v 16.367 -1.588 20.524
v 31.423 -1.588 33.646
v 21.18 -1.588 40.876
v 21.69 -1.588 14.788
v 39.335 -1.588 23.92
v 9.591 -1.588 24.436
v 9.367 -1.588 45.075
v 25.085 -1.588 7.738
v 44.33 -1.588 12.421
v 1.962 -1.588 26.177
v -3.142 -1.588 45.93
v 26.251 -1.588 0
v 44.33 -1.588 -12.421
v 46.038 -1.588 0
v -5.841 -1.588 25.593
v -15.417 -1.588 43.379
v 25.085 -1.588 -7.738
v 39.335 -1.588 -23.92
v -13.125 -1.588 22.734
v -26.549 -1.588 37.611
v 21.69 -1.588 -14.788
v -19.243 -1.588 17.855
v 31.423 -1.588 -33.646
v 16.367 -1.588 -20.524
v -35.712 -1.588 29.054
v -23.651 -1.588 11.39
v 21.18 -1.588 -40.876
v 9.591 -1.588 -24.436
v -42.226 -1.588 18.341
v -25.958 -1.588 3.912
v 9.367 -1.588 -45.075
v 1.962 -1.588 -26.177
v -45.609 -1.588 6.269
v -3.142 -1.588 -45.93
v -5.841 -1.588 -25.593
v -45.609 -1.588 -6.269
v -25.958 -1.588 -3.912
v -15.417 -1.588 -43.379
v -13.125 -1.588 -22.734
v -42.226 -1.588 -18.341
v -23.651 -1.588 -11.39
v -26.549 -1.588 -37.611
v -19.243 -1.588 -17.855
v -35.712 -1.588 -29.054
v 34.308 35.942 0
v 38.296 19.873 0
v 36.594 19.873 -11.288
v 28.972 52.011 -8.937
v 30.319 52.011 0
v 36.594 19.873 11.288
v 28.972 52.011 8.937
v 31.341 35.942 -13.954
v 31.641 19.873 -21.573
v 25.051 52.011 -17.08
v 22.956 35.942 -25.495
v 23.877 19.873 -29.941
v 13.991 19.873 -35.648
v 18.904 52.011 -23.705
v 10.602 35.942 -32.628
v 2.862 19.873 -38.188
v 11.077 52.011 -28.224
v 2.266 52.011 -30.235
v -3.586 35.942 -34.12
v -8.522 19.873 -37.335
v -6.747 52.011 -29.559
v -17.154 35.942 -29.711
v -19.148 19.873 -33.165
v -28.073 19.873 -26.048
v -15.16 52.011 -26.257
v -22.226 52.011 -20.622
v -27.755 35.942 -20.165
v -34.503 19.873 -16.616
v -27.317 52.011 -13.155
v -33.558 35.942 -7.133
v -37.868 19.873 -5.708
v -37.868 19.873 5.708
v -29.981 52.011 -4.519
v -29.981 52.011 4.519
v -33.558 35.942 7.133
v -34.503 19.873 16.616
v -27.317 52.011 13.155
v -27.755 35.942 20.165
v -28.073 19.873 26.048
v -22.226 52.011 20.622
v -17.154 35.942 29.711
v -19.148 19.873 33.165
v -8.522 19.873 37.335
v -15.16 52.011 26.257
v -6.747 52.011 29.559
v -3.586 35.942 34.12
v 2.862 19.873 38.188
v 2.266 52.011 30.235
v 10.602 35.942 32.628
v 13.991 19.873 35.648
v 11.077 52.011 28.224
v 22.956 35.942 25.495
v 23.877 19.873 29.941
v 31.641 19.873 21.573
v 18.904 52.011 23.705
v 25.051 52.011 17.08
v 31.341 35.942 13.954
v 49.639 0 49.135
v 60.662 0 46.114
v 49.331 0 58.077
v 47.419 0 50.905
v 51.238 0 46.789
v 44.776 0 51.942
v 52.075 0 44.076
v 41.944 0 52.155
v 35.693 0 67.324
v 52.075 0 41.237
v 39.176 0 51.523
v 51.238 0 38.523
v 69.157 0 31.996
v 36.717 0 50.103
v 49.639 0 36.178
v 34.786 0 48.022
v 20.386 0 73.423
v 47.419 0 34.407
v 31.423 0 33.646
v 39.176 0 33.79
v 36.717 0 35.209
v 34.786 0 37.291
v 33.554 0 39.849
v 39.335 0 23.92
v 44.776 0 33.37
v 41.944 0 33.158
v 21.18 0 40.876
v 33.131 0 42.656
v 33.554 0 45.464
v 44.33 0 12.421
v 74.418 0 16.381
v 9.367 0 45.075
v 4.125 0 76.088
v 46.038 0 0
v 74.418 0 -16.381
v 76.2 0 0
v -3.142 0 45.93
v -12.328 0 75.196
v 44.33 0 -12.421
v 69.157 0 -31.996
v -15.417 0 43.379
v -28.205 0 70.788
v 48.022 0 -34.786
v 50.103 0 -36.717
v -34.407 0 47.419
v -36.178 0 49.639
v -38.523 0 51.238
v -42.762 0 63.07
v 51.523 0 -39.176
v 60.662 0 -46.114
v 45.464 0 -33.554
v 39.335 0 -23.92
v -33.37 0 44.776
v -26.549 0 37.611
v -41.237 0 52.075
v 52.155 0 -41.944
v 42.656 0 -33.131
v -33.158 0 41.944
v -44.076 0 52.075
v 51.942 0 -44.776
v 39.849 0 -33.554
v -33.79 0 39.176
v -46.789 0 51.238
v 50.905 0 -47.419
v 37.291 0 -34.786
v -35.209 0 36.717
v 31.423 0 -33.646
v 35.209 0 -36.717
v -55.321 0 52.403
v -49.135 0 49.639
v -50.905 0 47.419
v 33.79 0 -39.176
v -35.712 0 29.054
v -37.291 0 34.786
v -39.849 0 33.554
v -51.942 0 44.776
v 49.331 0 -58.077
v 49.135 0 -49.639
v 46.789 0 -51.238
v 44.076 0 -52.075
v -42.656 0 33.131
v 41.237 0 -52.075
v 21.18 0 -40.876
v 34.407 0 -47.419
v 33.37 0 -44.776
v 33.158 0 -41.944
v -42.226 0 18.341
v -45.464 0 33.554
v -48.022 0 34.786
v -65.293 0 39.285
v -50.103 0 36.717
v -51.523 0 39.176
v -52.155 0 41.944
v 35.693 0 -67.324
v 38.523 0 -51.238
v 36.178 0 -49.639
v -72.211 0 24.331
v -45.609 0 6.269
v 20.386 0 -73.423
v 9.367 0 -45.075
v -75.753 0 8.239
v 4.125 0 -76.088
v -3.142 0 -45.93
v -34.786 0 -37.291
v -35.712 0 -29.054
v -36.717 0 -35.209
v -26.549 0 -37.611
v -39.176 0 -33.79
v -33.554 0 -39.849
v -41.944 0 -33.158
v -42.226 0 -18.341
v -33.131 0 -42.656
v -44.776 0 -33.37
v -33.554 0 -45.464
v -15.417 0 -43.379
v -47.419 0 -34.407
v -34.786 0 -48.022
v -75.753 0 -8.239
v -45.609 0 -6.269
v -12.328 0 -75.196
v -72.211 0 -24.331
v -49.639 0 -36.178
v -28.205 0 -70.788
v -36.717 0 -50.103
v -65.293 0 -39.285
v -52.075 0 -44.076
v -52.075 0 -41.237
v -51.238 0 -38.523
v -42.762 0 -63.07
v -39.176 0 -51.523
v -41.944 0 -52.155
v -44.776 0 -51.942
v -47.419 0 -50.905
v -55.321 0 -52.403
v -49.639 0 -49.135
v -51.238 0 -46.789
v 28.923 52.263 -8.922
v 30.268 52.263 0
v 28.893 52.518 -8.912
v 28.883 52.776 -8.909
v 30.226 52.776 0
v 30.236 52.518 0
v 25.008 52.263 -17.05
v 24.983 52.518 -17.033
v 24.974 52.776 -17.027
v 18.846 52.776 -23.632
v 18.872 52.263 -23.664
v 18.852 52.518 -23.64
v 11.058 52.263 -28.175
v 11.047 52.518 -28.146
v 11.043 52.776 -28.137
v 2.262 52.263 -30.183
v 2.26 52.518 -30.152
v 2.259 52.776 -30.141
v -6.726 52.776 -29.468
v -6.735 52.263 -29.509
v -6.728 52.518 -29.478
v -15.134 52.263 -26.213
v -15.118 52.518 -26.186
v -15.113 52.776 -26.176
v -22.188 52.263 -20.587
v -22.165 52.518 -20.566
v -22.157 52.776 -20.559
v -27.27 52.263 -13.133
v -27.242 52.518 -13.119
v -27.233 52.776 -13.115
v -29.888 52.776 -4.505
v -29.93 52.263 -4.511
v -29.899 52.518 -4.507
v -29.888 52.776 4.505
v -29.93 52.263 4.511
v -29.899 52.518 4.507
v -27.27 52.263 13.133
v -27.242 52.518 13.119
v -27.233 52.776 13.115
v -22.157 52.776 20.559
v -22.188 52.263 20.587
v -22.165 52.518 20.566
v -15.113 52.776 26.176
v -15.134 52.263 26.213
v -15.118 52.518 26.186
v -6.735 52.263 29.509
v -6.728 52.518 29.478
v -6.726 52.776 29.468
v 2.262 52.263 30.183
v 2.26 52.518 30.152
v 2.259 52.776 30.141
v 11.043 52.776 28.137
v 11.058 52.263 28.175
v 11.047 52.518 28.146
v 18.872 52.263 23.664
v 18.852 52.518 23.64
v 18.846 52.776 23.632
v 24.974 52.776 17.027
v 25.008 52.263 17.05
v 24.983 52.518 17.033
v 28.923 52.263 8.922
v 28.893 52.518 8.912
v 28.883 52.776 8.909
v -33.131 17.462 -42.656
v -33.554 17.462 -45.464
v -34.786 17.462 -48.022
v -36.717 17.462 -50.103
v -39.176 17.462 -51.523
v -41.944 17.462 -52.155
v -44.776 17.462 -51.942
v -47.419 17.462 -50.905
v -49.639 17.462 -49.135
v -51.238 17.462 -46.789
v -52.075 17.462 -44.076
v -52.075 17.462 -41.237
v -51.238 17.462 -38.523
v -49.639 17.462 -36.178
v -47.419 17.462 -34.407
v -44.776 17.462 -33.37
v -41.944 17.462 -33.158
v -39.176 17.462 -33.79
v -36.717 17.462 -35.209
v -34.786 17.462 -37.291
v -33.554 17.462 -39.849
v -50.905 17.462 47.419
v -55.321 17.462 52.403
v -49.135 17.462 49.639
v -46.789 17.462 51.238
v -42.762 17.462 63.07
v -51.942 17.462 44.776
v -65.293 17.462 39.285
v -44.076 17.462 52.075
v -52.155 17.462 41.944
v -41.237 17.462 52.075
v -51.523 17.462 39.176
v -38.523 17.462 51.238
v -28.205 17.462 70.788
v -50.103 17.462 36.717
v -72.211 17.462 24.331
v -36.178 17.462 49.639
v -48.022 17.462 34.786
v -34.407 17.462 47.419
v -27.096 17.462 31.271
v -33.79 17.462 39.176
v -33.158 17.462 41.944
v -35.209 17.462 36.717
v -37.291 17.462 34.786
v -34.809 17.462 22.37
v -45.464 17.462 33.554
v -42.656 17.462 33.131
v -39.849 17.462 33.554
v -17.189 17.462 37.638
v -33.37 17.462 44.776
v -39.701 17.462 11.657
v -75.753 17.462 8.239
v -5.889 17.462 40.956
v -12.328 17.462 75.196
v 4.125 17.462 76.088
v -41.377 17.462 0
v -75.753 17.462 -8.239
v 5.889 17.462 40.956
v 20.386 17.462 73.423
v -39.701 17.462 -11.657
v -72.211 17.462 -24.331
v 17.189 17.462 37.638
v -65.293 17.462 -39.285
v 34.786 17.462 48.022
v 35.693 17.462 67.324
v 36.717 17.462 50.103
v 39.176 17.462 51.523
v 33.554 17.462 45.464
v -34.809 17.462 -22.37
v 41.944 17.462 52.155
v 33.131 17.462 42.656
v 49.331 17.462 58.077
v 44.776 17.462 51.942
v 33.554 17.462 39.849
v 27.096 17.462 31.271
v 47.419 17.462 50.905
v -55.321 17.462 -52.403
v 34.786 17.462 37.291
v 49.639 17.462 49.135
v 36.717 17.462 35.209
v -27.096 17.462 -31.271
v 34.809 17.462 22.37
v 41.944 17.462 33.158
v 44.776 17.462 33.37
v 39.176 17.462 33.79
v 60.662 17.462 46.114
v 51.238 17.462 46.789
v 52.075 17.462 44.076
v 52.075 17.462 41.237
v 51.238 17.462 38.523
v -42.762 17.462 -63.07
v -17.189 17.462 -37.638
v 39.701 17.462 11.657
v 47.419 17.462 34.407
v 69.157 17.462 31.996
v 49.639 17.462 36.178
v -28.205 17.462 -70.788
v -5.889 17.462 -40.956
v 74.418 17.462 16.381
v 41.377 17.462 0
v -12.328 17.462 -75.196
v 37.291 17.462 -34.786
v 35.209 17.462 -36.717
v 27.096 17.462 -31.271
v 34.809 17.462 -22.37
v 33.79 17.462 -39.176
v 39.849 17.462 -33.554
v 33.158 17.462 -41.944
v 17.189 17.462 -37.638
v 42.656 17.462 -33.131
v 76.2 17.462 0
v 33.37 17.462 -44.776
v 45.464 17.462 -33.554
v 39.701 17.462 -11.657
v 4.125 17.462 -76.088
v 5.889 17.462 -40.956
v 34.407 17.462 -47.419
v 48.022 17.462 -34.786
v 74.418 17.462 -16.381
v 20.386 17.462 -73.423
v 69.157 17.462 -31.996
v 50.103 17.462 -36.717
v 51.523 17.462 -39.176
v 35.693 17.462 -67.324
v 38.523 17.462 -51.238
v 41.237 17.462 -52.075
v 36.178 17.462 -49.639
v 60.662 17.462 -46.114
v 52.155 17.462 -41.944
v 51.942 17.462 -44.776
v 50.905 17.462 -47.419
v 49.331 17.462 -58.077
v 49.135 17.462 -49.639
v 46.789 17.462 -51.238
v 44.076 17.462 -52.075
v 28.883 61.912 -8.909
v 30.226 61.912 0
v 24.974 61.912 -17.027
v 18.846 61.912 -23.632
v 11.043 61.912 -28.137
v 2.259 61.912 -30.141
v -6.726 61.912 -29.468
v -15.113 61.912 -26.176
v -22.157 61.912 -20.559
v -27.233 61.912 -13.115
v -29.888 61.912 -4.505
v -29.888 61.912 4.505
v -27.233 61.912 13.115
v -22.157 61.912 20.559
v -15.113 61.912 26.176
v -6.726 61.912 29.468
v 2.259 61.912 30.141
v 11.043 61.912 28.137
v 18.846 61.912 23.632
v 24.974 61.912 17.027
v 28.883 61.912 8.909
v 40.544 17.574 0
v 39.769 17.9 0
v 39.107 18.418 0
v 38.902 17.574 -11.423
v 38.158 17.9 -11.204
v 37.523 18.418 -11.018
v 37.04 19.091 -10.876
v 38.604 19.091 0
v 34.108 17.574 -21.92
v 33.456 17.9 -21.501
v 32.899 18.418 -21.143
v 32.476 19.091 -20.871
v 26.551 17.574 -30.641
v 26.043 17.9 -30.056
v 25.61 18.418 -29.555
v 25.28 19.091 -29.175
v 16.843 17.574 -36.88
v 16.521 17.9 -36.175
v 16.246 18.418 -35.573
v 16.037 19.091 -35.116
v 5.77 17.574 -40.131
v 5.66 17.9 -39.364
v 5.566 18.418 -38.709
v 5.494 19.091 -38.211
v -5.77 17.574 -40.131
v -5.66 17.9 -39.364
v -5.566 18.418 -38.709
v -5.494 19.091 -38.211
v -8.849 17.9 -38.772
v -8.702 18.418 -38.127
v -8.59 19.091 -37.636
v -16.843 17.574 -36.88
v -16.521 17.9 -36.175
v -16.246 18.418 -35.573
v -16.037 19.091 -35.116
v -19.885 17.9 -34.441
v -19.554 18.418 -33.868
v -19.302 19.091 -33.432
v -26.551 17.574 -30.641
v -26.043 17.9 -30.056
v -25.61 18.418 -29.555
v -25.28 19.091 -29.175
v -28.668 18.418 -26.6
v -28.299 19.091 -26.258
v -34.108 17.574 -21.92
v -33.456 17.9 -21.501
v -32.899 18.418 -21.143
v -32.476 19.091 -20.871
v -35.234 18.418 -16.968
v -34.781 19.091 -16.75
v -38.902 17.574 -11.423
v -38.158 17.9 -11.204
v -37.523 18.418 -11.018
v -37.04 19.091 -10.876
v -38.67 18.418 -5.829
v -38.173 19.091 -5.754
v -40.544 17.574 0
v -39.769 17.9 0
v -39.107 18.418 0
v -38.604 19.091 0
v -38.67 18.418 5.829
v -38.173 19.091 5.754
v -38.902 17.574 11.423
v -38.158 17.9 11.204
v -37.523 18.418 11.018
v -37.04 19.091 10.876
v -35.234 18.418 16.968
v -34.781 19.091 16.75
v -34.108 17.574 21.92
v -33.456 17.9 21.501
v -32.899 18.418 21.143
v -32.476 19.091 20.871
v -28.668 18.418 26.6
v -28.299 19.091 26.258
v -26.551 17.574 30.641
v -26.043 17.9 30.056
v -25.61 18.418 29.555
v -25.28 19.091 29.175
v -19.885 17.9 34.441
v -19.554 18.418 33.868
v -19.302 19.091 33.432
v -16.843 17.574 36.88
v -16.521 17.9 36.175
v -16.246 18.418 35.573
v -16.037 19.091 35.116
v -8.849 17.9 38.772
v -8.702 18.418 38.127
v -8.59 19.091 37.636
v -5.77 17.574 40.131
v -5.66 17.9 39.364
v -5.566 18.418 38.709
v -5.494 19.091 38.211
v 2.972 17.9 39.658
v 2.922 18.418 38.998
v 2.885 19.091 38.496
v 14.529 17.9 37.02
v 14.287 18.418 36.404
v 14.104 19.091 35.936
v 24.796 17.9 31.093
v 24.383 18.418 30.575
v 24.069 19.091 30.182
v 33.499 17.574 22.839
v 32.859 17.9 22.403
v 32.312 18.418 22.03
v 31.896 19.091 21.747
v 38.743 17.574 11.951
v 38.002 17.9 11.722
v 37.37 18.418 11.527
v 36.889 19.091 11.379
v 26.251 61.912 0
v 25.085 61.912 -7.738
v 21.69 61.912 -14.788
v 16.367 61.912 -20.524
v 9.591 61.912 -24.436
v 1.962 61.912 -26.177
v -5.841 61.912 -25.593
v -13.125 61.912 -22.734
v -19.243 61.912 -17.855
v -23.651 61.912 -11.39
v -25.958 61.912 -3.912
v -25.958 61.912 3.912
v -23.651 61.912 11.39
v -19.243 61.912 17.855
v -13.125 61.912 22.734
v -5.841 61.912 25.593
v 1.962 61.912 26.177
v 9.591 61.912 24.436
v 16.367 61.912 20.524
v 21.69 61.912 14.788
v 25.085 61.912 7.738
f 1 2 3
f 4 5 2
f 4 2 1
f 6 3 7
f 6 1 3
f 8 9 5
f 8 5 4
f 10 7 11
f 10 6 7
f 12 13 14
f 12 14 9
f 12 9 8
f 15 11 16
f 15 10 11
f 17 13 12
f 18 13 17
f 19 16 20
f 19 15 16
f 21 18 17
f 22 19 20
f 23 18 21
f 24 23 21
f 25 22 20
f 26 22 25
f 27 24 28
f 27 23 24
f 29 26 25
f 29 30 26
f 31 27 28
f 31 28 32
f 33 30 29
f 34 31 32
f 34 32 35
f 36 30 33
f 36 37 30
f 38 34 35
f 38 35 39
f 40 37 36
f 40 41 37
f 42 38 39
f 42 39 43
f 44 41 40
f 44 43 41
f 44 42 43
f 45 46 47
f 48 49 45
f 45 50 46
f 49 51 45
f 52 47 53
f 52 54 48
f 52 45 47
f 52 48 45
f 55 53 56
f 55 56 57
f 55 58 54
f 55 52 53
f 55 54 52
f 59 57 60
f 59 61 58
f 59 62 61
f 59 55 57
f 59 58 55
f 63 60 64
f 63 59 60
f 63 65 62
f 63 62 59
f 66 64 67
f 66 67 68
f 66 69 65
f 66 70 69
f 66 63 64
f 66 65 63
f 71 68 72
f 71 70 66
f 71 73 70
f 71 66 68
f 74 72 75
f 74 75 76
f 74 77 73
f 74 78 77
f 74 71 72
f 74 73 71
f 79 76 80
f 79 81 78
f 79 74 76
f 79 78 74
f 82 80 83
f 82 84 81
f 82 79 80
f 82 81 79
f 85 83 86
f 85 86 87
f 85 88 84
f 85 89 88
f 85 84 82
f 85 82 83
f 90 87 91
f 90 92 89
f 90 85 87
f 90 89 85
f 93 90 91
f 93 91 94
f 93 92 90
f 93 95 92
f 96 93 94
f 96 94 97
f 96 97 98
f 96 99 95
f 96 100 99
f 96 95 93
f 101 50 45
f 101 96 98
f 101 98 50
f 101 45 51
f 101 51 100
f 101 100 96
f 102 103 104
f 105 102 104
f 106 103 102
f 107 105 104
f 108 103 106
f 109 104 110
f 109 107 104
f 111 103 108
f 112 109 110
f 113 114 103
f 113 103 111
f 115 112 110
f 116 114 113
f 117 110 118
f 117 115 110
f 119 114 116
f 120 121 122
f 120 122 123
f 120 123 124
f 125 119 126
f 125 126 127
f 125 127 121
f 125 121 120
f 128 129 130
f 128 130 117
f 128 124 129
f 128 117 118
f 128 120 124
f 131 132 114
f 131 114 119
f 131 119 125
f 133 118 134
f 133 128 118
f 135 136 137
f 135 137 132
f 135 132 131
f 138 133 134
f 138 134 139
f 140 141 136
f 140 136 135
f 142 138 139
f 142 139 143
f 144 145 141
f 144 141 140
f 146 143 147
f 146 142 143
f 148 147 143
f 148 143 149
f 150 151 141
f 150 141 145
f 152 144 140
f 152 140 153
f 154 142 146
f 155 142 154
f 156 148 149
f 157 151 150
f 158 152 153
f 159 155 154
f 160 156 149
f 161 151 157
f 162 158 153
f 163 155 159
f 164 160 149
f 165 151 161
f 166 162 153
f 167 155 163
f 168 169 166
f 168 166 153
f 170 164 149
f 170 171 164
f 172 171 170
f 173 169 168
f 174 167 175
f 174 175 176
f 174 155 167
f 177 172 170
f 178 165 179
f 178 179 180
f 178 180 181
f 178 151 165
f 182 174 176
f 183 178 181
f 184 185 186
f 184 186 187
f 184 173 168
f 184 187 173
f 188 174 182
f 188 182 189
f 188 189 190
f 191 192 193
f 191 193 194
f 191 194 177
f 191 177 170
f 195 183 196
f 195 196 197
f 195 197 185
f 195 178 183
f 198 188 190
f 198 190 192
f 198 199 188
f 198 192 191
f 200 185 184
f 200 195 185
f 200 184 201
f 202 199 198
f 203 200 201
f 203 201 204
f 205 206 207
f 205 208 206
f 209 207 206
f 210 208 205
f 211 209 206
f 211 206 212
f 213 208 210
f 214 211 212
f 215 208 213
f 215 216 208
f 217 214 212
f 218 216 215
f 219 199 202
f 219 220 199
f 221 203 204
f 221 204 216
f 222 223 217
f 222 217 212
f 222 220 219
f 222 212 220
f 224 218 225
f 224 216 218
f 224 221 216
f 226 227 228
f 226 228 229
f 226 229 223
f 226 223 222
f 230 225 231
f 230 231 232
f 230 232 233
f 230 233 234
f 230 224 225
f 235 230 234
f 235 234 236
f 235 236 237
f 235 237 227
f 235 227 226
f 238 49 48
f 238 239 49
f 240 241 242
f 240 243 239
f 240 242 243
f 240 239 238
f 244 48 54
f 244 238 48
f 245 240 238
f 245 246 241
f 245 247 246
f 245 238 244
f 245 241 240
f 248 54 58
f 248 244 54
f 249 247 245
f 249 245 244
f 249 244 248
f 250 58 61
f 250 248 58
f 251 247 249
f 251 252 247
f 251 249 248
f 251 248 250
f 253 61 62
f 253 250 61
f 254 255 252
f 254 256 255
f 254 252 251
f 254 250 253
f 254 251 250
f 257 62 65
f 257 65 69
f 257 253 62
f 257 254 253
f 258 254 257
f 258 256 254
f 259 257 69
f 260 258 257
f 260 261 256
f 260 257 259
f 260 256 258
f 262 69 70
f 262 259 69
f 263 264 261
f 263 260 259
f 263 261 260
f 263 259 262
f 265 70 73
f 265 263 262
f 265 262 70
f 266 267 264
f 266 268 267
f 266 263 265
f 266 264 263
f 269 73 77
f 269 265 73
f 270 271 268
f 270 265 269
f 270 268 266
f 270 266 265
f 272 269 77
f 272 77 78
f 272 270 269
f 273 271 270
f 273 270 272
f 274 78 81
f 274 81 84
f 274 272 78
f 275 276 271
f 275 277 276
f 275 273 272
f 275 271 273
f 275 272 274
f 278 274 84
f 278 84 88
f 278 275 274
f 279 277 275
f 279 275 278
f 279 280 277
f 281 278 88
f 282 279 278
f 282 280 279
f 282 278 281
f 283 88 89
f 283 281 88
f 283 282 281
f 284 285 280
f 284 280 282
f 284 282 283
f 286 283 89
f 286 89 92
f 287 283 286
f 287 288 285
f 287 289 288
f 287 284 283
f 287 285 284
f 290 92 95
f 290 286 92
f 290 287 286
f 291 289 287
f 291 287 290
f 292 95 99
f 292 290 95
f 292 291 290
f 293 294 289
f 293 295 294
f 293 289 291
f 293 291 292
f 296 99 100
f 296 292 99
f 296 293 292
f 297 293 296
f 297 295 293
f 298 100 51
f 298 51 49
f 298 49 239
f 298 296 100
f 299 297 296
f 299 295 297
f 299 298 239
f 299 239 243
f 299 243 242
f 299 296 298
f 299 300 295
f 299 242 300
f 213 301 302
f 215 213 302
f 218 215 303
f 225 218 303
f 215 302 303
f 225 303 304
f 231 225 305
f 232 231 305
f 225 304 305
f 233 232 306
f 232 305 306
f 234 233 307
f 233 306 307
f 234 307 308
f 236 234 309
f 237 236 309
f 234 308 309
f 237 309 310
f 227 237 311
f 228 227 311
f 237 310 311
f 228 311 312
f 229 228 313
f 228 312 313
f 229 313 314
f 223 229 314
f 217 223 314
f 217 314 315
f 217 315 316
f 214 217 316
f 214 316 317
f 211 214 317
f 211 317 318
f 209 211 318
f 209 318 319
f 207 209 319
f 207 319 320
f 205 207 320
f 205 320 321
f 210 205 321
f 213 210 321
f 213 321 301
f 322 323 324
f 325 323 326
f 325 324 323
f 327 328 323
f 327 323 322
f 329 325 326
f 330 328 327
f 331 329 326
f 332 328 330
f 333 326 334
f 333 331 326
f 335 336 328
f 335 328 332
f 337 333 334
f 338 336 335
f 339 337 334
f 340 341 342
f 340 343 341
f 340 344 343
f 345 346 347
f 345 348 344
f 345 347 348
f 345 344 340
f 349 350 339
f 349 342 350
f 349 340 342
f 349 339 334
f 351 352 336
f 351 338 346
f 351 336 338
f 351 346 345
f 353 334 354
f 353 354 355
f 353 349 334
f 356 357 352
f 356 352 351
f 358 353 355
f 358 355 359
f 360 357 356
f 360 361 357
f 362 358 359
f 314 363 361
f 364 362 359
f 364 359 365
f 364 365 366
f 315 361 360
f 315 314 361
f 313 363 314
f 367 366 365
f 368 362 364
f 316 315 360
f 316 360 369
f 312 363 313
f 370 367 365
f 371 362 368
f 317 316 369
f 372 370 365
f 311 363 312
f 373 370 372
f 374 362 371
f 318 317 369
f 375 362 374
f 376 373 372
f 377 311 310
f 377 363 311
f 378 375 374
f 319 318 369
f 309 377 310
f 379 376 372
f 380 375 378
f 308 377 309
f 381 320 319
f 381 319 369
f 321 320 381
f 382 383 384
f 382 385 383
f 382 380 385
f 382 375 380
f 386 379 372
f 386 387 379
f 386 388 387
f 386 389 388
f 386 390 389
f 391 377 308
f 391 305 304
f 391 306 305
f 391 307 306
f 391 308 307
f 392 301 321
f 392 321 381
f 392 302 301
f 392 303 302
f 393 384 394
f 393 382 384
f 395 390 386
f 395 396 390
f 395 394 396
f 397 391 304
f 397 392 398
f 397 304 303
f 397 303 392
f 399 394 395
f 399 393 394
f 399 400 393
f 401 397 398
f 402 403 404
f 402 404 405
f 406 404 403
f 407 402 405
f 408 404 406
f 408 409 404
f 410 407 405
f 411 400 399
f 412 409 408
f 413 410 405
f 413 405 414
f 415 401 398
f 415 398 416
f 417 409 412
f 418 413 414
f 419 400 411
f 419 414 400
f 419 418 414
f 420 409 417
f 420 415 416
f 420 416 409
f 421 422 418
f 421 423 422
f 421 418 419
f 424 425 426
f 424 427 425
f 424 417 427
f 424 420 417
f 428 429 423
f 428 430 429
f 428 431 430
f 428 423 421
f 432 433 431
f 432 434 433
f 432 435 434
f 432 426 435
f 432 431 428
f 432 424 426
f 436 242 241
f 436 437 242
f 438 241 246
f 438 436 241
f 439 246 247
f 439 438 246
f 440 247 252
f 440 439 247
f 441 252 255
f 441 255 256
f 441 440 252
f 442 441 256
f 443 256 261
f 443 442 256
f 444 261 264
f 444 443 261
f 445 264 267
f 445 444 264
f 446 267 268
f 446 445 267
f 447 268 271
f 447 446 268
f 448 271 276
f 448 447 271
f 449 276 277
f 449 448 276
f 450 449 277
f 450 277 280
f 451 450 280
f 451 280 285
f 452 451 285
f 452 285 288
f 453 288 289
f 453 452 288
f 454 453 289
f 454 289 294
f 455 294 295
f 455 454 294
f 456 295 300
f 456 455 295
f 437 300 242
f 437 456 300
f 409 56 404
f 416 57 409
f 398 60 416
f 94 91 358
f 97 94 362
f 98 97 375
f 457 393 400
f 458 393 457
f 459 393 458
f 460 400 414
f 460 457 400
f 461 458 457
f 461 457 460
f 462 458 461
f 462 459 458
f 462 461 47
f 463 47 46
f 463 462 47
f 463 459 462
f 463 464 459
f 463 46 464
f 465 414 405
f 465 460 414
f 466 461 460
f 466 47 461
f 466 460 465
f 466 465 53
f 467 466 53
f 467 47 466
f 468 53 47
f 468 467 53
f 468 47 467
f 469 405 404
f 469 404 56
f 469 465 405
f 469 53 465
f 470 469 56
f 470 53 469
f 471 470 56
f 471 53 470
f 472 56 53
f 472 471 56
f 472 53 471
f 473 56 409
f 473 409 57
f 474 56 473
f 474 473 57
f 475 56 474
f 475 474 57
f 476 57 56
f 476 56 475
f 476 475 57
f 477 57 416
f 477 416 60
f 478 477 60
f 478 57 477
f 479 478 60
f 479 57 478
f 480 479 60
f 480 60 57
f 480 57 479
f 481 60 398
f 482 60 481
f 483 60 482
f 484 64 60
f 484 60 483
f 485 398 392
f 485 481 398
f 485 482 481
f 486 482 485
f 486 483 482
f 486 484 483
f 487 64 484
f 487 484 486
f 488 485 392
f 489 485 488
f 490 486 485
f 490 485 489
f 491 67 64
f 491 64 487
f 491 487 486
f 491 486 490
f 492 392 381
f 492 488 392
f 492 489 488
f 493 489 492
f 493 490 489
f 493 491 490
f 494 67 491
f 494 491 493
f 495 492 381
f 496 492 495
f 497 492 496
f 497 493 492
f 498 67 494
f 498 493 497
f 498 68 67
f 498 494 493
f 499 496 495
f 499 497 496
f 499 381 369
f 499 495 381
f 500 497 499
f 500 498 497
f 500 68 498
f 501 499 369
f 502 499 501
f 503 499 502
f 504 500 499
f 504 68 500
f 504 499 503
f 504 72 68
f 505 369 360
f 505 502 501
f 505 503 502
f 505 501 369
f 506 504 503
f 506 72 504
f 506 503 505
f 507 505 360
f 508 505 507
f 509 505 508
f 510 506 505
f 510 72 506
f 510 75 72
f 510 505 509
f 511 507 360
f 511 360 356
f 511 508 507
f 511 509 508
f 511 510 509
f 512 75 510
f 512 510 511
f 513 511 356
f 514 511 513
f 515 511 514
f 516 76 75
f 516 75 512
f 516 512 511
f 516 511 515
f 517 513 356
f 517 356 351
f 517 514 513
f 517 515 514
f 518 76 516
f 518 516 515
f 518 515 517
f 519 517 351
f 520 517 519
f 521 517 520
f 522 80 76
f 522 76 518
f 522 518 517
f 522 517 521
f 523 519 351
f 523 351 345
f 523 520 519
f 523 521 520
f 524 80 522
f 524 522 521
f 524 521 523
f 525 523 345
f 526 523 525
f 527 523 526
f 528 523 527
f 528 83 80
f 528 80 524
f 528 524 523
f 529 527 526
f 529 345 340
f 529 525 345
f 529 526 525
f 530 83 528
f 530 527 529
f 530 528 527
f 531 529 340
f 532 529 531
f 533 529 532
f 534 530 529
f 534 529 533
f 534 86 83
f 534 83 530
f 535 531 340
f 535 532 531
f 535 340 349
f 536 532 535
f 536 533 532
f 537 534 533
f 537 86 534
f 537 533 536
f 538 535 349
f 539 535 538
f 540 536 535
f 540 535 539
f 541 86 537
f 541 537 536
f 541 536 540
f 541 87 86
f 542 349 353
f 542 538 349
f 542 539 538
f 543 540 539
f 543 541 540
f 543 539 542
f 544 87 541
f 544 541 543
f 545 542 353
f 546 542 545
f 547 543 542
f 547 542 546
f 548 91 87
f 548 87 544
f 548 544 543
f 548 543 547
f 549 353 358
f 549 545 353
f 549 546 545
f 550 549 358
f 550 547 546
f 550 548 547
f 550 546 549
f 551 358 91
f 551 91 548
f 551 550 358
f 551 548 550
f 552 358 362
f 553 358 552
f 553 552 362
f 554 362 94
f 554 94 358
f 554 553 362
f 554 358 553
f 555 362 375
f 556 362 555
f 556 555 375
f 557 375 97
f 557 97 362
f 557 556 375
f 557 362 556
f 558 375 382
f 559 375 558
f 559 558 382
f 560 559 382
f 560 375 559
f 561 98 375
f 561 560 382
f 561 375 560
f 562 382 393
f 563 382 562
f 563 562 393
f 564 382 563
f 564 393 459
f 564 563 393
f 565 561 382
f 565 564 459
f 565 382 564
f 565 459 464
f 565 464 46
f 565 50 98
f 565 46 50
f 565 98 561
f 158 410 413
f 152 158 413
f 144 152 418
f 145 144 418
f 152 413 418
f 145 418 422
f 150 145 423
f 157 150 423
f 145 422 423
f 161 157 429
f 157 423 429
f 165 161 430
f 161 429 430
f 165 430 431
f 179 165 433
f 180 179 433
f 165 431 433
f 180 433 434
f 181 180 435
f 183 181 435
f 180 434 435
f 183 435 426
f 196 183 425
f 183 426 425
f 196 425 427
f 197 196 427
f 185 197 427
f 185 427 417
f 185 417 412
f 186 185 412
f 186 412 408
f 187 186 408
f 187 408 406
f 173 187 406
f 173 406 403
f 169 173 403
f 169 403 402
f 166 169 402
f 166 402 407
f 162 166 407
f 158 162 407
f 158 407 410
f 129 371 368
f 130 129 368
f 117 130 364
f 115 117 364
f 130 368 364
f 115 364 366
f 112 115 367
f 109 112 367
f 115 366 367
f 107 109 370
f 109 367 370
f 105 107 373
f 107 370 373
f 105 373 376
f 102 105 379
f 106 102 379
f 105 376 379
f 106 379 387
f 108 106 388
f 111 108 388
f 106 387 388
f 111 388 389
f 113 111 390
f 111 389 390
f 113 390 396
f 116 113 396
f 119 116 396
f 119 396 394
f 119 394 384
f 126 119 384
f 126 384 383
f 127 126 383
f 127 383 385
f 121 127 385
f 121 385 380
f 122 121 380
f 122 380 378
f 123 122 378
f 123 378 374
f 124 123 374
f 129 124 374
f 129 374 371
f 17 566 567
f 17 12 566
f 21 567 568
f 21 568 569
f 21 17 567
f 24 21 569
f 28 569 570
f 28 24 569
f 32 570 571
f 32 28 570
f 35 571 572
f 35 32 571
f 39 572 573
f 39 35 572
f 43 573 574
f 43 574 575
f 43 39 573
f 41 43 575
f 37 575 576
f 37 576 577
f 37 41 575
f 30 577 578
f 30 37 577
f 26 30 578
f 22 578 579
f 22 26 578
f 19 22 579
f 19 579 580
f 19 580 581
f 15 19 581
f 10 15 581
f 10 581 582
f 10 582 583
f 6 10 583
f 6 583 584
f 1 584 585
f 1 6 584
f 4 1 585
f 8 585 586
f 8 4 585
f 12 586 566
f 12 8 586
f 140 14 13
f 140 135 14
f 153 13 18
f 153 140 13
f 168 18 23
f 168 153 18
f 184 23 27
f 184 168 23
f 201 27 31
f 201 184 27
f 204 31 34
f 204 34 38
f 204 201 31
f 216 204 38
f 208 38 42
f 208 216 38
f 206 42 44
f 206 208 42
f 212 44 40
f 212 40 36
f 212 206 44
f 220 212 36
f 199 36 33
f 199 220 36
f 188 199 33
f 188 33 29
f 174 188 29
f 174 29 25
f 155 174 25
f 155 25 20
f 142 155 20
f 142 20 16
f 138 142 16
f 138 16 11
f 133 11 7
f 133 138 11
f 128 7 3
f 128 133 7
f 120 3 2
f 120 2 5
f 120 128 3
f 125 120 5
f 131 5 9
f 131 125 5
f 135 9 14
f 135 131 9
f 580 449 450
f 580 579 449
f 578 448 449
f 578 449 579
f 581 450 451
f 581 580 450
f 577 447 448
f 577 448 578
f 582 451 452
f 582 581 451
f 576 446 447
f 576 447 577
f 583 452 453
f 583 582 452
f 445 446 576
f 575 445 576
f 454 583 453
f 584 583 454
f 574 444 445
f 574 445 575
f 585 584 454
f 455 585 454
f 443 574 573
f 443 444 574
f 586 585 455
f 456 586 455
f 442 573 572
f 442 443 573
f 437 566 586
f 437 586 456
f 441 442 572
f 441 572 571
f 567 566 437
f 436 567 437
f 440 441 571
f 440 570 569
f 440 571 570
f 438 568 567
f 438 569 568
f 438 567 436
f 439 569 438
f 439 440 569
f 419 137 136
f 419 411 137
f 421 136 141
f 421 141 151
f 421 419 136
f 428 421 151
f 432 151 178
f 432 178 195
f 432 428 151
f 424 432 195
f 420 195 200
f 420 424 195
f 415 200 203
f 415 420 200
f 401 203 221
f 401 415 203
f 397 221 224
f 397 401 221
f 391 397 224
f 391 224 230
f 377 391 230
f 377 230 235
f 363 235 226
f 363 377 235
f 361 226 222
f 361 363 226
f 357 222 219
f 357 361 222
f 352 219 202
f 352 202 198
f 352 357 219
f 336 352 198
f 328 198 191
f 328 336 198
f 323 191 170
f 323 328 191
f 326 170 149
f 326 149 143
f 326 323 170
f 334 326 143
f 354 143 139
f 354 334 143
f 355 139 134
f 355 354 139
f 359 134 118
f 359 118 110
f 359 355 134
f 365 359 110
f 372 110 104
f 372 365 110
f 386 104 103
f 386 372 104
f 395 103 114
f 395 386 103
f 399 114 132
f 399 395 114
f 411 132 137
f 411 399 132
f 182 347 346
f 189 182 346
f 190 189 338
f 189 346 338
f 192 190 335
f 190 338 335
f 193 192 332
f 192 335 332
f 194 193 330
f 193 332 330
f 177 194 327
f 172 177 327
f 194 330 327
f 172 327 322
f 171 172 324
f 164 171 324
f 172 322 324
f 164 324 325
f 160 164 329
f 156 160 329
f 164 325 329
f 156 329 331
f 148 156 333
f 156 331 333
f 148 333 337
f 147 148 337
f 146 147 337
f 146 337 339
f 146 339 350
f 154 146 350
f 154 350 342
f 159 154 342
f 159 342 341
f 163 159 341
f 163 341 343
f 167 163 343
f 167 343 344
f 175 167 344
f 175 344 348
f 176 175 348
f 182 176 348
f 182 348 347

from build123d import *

# Parameters (mm, degrees)
SKETCH4_R               = 9.525
F_1ST_BOLT_HOLE_DEPTH   = 20.05
BOLT_HOLE_PATTERN_COUNT = 4


with BuildPart() as part:
    # Sketch3 → Base-Revolve (revolve)
    with BuildSketch(Plane.XY):
        with BuildLine():
            Line((26.2509, 61.9125), (26.2509, -1.5875))
            Line((26.2509, -1.5875), (46.0375, -1.5875))
            Line((46.0375, -1.5875), (46.0375, 0))
            Line((46.0375, 0), (76.2, 0))
            Line((76.2, 0), (76.2, 17.4625))
            Line((76.2, 17.4625), (41.377092519, 17.4625))
            ThreePointArc((41.377092519, 17.4625), (39.421017335, 18.13662118), (38.295576299, 19.872723702))
            Line((38.295576299, 19.872723702), (30.31948378, 52.010825428))
            ThreePointArc((30.31948378, 52.010825428), (30.2494576, 52.390367381), (30.226, 52.775601727))
            Line((30.226, 52.775601727), (30.226, 61.9125))
            Line((30.226, 61.9125), (26.2509, 61.9125))
        make_face()
    revolve(axis=Axis((0, 0, 0), (0, 1, 0)))

    # Sketch4 → 1st Bolt Hole (cut, through all)
    with BuildSketch(Plane(origin=(0, 17.4625, 0), x_dir=(-1, 0, 0), z_dir=(0, 1, 0))):
        with Locations((-42.656216575, 42.656216575)):
            Circle(SKETCH4_R)
    f_1st_bolt_hole = extrude(amount=-F_1ST_BOLT_HOLE_DEPTH, mode=Mode.SUBTRACT)

    # Bolt Hole Pattern: 1st Bolt Hole ×4 about axis
    bolt_hole_pattern_axis = Axis((0, 0, 0), (0, 1, 0))
    for i in range(1, BOLT_HOLE_PATTERN_COUNT):
        add(f_1st_bolt_hole.rotate(bolt_hole_pattern_axis, i * 360 / BOLT_HOLE_PATTERN_COUNT), mode=Mode.SUBTRACT)


solid = part.part
